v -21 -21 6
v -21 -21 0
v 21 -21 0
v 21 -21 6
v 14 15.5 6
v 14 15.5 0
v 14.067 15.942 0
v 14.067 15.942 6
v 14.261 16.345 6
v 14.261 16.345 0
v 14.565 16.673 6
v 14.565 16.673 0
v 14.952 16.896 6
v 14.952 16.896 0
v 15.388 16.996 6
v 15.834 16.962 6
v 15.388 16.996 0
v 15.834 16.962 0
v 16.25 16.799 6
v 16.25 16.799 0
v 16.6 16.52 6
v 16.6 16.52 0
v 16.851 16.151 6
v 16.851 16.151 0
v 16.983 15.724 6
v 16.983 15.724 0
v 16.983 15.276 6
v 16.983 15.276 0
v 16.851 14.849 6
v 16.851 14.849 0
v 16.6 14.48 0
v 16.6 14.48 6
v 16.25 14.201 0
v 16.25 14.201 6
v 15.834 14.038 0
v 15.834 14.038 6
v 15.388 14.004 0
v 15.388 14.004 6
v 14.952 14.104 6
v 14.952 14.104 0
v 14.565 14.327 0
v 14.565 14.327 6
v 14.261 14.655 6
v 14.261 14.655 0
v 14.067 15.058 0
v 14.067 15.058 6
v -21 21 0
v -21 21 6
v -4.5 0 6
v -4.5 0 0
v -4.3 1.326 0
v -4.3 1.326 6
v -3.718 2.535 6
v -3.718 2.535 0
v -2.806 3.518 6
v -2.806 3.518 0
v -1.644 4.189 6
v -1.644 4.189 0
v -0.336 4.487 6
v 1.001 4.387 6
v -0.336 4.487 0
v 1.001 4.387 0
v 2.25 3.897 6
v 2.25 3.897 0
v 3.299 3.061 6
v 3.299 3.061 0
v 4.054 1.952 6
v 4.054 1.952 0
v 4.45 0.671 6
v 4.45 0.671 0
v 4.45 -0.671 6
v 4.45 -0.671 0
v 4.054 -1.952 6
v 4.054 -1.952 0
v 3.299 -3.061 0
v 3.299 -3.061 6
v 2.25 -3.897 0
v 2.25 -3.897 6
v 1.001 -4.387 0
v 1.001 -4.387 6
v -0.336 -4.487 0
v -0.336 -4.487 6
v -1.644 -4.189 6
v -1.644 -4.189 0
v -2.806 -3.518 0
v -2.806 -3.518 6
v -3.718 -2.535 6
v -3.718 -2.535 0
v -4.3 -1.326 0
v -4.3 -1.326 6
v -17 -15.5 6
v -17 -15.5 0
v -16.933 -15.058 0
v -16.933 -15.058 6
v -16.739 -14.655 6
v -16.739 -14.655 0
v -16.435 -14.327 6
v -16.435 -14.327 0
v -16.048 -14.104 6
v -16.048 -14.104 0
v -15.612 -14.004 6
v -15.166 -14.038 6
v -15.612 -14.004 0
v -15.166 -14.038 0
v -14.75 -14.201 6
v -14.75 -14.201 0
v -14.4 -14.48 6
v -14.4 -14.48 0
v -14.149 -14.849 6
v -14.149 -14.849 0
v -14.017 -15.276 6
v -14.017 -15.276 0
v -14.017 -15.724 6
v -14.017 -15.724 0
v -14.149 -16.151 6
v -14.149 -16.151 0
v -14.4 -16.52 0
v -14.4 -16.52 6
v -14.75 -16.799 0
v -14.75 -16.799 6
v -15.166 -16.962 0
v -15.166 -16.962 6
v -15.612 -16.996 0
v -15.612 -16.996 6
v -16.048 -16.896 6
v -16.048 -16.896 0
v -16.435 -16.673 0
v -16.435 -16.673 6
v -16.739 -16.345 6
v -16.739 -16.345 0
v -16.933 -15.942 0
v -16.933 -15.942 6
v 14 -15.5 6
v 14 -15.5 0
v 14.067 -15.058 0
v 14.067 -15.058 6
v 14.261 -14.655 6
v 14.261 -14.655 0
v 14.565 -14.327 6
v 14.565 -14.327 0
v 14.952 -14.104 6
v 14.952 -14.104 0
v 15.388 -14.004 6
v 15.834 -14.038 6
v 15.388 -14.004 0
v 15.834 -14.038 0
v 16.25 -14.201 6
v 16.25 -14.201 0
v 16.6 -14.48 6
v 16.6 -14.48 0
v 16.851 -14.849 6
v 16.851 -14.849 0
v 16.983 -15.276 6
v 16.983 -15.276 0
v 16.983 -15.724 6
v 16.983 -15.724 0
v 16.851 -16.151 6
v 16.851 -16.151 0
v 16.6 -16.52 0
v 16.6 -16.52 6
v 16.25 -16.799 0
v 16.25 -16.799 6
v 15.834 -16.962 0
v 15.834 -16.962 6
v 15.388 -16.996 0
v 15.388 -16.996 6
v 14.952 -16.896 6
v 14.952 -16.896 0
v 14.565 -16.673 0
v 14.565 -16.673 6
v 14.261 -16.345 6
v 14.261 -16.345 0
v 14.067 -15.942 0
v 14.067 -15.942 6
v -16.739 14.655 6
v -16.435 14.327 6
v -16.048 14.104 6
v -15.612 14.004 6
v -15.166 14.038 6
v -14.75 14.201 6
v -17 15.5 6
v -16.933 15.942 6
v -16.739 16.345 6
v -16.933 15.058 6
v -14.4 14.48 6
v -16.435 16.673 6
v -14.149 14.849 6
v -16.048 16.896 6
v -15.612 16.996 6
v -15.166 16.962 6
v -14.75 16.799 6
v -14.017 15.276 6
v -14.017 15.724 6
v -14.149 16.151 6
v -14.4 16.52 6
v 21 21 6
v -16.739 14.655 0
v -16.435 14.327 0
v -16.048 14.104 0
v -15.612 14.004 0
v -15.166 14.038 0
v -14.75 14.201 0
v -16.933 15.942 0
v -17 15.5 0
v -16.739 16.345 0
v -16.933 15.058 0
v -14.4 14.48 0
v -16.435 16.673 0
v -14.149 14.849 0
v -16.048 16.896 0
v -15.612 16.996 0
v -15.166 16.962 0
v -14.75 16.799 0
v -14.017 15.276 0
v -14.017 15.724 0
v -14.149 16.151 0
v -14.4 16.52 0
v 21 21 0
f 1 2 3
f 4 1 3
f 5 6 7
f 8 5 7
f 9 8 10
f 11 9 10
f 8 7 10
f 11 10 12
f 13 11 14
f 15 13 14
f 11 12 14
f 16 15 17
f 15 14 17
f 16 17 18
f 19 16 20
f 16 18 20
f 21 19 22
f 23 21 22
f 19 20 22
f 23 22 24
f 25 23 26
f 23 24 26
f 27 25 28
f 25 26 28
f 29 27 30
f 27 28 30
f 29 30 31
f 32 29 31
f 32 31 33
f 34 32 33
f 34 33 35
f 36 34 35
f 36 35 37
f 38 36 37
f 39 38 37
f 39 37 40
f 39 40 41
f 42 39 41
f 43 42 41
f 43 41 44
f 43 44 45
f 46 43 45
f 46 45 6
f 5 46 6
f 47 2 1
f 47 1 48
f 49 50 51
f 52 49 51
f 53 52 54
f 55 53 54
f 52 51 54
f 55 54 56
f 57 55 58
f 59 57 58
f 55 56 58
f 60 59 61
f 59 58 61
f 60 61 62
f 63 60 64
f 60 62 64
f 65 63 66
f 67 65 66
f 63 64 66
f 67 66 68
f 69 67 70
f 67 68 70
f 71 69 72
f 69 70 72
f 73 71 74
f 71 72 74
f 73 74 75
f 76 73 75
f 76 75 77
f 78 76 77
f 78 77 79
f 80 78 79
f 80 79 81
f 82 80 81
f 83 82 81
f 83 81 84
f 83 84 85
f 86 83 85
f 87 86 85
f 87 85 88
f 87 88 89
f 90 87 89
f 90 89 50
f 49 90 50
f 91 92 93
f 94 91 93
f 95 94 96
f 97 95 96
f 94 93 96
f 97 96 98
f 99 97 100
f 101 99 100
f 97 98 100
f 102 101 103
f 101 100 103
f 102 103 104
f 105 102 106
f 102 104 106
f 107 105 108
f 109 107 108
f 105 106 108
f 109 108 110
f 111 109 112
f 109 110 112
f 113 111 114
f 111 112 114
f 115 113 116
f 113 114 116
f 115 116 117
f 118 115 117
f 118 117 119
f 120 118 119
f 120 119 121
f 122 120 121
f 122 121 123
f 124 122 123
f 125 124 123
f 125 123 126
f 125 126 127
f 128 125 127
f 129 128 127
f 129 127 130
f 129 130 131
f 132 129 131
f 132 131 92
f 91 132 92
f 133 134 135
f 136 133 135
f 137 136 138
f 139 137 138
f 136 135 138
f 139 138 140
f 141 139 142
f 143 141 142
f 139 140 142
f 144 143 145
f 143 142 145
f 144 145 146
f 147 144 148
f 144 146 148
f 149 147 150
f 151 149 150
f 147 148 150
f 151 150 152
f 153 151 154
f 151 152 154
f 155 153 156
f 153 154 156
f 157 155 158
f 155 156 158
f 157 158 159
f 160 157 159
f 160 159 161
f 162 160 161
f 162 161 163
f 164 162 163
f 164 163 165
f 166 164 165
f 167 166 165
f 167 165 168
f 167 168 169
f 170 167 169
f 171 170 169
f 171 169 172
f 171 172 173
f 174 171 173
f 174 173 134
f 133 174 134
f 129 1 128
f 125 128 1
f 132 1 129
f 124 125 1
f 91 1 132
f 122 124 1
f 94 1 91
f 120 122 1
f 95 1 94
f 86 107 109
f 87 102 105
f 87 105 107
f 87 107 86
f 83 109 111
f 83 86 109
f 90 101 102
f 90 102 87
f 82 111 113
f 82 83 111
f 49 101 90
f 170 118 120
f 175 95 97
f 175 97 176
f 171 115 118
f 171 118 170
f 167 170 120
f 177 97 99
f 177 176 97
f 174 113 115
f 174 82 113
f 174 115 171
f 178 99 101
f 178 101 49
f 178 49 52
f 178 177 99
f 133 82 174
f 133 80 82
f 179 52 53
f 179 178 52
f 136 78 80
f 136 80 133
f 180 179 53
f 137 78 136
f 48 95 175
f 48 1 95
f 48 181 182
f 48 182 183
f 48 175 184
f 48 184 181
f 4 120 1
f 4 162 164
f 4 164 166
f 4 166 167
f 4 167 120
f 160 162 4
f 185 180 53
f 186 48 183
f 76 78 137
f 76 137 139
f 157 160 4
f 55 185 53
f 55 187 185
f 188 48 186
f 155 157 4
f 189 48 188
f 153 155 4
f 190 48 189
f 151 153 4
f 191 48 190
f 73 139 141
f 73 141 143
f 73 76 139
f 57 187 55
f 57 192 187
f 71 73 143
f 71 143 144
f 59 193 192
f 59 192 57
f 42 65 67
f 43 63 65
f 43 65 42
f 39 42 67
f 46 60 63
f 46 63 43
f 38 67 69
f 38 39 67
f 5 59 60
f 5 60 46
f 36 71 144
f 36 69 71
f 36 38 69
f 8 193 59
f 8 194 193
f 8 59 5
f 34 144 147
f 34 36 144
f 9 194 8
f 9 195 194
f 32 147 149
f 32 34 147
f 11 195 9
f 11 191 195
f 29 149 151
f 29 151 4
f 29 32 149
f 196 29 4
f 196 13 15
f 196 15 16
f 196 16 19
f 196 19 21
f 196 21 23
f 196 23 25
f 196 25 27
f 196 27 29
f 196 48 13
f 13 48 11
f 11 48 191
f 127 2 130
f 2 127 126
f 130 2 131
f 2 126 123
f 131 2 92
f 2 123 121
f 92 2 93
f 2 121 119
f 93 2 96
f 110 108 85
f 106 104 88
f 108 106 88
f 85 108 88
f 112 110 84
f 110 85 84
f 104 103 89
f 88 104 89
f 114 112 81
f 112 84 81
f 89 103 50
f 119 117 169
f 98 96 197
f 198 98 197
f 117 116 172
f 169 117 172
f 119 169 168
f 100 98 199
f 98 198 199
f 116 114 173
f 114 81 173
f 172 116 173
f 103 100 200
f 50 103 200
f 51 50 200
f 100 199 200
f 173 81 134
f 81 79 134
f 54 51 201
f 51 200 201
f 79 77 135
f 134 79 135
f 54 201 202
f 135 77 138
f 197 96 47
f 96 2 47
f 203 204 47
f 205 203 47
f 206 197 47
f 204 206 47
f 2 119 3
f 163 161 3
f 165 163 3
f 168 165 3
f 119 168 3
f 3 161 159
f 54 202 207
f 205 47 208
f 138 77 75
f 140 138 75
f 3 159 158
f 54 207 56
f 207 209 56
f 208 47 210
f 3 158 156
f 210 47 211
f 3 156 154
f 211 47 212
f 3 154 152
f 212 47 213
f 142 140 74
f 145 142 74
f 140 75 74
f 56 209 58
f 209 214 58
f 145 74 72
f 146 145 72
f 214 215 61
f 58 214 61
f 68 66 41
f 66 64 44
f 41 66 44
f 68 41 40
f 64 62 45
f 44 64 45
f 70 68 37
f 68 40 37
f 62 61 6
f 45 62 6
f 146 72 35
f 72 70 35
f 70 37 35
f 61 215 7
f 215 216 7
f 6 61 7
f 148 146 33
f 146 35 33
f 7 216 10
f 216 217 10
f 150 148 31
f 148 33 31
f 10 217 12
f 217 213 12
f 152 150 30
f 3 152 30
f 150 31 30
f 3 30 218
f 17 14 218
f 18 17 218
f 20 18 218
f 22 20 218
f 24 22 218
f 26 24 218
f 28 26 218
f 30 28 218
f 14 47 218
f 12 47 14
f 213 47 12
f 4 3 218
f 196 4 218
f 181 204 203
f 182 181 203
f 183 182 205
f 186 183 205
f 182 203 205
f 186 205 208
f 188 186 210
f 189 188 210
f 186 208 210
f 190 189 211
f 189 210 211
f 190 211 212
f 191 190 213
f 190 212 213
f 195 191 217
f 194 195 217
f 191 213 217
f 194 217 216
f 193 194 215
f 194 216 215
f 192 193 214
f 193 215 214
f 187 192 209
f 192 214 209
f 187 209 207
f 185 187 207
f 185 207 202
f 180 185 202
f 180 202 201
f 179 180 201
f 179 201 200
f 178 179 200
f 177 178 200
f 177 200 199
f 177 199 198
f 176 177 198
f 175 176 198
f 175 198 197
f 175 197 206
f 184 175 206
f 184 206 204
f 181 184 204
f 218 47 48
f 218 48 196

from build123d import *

# Parameters (mm, degrees)
SKETCH_1_W          = 42
SKETCH_1_H          = 42
EXTRUDE_1_DEPTH     = 6
SKETCH_2_R          = 1.5
CUT_EXTRUDE_1_DEPTH = 31.298514815
SKETCH_3_R          = 4.5
CUT_EXTRUDE_2_DEPTH = 31.298514815


with BuildPart() as part:
    # 草图1 → 凸台-拉伸1 (new body)
    with BuildSketch(Plane.XY):
        Rectangle(SKETCH_1_W, SKETCH_1_H)
    extrude(amount=EXTRUDE_1_DEPTH)

    # 草图2 → 切除-拉伸1 (cut, through all)
    with BuildSketch(Plane(origin=(0, 0, 0), x_dir=(-1, 0, 0), z_dir=(0, 0, -1))):
        with Locations((-15.5, 15.5)):
            Circle(SKETCH_2_R)
        with Locations((15.5, 15.5)):
            Circle(SKETCH_2_R)
        with Locations((15.5, -15.5)):
            Circle(SKETCH_2_R)
        with Locations((-15.5, -15.5)):
            Circle(SKETCH_2_R)
    extrude(amount=-CUT_EXTRUDE_1_DEPTH, mode=Mode.SUBTRACT)

    # 草图3 → 切除-拉伸2 (cut, through all)
    with BuildSketch(Plane(origin=(0, 0, 0), x_dir=(-1, 0, 0), z_dir=(0, 0, -1))):
        Circle(SKETCH_3_R)
    extrude(amount=-CUT_EXTRUDE_2_DEPTH, mode=Mode.SUBTRACT)


solid = part.part
